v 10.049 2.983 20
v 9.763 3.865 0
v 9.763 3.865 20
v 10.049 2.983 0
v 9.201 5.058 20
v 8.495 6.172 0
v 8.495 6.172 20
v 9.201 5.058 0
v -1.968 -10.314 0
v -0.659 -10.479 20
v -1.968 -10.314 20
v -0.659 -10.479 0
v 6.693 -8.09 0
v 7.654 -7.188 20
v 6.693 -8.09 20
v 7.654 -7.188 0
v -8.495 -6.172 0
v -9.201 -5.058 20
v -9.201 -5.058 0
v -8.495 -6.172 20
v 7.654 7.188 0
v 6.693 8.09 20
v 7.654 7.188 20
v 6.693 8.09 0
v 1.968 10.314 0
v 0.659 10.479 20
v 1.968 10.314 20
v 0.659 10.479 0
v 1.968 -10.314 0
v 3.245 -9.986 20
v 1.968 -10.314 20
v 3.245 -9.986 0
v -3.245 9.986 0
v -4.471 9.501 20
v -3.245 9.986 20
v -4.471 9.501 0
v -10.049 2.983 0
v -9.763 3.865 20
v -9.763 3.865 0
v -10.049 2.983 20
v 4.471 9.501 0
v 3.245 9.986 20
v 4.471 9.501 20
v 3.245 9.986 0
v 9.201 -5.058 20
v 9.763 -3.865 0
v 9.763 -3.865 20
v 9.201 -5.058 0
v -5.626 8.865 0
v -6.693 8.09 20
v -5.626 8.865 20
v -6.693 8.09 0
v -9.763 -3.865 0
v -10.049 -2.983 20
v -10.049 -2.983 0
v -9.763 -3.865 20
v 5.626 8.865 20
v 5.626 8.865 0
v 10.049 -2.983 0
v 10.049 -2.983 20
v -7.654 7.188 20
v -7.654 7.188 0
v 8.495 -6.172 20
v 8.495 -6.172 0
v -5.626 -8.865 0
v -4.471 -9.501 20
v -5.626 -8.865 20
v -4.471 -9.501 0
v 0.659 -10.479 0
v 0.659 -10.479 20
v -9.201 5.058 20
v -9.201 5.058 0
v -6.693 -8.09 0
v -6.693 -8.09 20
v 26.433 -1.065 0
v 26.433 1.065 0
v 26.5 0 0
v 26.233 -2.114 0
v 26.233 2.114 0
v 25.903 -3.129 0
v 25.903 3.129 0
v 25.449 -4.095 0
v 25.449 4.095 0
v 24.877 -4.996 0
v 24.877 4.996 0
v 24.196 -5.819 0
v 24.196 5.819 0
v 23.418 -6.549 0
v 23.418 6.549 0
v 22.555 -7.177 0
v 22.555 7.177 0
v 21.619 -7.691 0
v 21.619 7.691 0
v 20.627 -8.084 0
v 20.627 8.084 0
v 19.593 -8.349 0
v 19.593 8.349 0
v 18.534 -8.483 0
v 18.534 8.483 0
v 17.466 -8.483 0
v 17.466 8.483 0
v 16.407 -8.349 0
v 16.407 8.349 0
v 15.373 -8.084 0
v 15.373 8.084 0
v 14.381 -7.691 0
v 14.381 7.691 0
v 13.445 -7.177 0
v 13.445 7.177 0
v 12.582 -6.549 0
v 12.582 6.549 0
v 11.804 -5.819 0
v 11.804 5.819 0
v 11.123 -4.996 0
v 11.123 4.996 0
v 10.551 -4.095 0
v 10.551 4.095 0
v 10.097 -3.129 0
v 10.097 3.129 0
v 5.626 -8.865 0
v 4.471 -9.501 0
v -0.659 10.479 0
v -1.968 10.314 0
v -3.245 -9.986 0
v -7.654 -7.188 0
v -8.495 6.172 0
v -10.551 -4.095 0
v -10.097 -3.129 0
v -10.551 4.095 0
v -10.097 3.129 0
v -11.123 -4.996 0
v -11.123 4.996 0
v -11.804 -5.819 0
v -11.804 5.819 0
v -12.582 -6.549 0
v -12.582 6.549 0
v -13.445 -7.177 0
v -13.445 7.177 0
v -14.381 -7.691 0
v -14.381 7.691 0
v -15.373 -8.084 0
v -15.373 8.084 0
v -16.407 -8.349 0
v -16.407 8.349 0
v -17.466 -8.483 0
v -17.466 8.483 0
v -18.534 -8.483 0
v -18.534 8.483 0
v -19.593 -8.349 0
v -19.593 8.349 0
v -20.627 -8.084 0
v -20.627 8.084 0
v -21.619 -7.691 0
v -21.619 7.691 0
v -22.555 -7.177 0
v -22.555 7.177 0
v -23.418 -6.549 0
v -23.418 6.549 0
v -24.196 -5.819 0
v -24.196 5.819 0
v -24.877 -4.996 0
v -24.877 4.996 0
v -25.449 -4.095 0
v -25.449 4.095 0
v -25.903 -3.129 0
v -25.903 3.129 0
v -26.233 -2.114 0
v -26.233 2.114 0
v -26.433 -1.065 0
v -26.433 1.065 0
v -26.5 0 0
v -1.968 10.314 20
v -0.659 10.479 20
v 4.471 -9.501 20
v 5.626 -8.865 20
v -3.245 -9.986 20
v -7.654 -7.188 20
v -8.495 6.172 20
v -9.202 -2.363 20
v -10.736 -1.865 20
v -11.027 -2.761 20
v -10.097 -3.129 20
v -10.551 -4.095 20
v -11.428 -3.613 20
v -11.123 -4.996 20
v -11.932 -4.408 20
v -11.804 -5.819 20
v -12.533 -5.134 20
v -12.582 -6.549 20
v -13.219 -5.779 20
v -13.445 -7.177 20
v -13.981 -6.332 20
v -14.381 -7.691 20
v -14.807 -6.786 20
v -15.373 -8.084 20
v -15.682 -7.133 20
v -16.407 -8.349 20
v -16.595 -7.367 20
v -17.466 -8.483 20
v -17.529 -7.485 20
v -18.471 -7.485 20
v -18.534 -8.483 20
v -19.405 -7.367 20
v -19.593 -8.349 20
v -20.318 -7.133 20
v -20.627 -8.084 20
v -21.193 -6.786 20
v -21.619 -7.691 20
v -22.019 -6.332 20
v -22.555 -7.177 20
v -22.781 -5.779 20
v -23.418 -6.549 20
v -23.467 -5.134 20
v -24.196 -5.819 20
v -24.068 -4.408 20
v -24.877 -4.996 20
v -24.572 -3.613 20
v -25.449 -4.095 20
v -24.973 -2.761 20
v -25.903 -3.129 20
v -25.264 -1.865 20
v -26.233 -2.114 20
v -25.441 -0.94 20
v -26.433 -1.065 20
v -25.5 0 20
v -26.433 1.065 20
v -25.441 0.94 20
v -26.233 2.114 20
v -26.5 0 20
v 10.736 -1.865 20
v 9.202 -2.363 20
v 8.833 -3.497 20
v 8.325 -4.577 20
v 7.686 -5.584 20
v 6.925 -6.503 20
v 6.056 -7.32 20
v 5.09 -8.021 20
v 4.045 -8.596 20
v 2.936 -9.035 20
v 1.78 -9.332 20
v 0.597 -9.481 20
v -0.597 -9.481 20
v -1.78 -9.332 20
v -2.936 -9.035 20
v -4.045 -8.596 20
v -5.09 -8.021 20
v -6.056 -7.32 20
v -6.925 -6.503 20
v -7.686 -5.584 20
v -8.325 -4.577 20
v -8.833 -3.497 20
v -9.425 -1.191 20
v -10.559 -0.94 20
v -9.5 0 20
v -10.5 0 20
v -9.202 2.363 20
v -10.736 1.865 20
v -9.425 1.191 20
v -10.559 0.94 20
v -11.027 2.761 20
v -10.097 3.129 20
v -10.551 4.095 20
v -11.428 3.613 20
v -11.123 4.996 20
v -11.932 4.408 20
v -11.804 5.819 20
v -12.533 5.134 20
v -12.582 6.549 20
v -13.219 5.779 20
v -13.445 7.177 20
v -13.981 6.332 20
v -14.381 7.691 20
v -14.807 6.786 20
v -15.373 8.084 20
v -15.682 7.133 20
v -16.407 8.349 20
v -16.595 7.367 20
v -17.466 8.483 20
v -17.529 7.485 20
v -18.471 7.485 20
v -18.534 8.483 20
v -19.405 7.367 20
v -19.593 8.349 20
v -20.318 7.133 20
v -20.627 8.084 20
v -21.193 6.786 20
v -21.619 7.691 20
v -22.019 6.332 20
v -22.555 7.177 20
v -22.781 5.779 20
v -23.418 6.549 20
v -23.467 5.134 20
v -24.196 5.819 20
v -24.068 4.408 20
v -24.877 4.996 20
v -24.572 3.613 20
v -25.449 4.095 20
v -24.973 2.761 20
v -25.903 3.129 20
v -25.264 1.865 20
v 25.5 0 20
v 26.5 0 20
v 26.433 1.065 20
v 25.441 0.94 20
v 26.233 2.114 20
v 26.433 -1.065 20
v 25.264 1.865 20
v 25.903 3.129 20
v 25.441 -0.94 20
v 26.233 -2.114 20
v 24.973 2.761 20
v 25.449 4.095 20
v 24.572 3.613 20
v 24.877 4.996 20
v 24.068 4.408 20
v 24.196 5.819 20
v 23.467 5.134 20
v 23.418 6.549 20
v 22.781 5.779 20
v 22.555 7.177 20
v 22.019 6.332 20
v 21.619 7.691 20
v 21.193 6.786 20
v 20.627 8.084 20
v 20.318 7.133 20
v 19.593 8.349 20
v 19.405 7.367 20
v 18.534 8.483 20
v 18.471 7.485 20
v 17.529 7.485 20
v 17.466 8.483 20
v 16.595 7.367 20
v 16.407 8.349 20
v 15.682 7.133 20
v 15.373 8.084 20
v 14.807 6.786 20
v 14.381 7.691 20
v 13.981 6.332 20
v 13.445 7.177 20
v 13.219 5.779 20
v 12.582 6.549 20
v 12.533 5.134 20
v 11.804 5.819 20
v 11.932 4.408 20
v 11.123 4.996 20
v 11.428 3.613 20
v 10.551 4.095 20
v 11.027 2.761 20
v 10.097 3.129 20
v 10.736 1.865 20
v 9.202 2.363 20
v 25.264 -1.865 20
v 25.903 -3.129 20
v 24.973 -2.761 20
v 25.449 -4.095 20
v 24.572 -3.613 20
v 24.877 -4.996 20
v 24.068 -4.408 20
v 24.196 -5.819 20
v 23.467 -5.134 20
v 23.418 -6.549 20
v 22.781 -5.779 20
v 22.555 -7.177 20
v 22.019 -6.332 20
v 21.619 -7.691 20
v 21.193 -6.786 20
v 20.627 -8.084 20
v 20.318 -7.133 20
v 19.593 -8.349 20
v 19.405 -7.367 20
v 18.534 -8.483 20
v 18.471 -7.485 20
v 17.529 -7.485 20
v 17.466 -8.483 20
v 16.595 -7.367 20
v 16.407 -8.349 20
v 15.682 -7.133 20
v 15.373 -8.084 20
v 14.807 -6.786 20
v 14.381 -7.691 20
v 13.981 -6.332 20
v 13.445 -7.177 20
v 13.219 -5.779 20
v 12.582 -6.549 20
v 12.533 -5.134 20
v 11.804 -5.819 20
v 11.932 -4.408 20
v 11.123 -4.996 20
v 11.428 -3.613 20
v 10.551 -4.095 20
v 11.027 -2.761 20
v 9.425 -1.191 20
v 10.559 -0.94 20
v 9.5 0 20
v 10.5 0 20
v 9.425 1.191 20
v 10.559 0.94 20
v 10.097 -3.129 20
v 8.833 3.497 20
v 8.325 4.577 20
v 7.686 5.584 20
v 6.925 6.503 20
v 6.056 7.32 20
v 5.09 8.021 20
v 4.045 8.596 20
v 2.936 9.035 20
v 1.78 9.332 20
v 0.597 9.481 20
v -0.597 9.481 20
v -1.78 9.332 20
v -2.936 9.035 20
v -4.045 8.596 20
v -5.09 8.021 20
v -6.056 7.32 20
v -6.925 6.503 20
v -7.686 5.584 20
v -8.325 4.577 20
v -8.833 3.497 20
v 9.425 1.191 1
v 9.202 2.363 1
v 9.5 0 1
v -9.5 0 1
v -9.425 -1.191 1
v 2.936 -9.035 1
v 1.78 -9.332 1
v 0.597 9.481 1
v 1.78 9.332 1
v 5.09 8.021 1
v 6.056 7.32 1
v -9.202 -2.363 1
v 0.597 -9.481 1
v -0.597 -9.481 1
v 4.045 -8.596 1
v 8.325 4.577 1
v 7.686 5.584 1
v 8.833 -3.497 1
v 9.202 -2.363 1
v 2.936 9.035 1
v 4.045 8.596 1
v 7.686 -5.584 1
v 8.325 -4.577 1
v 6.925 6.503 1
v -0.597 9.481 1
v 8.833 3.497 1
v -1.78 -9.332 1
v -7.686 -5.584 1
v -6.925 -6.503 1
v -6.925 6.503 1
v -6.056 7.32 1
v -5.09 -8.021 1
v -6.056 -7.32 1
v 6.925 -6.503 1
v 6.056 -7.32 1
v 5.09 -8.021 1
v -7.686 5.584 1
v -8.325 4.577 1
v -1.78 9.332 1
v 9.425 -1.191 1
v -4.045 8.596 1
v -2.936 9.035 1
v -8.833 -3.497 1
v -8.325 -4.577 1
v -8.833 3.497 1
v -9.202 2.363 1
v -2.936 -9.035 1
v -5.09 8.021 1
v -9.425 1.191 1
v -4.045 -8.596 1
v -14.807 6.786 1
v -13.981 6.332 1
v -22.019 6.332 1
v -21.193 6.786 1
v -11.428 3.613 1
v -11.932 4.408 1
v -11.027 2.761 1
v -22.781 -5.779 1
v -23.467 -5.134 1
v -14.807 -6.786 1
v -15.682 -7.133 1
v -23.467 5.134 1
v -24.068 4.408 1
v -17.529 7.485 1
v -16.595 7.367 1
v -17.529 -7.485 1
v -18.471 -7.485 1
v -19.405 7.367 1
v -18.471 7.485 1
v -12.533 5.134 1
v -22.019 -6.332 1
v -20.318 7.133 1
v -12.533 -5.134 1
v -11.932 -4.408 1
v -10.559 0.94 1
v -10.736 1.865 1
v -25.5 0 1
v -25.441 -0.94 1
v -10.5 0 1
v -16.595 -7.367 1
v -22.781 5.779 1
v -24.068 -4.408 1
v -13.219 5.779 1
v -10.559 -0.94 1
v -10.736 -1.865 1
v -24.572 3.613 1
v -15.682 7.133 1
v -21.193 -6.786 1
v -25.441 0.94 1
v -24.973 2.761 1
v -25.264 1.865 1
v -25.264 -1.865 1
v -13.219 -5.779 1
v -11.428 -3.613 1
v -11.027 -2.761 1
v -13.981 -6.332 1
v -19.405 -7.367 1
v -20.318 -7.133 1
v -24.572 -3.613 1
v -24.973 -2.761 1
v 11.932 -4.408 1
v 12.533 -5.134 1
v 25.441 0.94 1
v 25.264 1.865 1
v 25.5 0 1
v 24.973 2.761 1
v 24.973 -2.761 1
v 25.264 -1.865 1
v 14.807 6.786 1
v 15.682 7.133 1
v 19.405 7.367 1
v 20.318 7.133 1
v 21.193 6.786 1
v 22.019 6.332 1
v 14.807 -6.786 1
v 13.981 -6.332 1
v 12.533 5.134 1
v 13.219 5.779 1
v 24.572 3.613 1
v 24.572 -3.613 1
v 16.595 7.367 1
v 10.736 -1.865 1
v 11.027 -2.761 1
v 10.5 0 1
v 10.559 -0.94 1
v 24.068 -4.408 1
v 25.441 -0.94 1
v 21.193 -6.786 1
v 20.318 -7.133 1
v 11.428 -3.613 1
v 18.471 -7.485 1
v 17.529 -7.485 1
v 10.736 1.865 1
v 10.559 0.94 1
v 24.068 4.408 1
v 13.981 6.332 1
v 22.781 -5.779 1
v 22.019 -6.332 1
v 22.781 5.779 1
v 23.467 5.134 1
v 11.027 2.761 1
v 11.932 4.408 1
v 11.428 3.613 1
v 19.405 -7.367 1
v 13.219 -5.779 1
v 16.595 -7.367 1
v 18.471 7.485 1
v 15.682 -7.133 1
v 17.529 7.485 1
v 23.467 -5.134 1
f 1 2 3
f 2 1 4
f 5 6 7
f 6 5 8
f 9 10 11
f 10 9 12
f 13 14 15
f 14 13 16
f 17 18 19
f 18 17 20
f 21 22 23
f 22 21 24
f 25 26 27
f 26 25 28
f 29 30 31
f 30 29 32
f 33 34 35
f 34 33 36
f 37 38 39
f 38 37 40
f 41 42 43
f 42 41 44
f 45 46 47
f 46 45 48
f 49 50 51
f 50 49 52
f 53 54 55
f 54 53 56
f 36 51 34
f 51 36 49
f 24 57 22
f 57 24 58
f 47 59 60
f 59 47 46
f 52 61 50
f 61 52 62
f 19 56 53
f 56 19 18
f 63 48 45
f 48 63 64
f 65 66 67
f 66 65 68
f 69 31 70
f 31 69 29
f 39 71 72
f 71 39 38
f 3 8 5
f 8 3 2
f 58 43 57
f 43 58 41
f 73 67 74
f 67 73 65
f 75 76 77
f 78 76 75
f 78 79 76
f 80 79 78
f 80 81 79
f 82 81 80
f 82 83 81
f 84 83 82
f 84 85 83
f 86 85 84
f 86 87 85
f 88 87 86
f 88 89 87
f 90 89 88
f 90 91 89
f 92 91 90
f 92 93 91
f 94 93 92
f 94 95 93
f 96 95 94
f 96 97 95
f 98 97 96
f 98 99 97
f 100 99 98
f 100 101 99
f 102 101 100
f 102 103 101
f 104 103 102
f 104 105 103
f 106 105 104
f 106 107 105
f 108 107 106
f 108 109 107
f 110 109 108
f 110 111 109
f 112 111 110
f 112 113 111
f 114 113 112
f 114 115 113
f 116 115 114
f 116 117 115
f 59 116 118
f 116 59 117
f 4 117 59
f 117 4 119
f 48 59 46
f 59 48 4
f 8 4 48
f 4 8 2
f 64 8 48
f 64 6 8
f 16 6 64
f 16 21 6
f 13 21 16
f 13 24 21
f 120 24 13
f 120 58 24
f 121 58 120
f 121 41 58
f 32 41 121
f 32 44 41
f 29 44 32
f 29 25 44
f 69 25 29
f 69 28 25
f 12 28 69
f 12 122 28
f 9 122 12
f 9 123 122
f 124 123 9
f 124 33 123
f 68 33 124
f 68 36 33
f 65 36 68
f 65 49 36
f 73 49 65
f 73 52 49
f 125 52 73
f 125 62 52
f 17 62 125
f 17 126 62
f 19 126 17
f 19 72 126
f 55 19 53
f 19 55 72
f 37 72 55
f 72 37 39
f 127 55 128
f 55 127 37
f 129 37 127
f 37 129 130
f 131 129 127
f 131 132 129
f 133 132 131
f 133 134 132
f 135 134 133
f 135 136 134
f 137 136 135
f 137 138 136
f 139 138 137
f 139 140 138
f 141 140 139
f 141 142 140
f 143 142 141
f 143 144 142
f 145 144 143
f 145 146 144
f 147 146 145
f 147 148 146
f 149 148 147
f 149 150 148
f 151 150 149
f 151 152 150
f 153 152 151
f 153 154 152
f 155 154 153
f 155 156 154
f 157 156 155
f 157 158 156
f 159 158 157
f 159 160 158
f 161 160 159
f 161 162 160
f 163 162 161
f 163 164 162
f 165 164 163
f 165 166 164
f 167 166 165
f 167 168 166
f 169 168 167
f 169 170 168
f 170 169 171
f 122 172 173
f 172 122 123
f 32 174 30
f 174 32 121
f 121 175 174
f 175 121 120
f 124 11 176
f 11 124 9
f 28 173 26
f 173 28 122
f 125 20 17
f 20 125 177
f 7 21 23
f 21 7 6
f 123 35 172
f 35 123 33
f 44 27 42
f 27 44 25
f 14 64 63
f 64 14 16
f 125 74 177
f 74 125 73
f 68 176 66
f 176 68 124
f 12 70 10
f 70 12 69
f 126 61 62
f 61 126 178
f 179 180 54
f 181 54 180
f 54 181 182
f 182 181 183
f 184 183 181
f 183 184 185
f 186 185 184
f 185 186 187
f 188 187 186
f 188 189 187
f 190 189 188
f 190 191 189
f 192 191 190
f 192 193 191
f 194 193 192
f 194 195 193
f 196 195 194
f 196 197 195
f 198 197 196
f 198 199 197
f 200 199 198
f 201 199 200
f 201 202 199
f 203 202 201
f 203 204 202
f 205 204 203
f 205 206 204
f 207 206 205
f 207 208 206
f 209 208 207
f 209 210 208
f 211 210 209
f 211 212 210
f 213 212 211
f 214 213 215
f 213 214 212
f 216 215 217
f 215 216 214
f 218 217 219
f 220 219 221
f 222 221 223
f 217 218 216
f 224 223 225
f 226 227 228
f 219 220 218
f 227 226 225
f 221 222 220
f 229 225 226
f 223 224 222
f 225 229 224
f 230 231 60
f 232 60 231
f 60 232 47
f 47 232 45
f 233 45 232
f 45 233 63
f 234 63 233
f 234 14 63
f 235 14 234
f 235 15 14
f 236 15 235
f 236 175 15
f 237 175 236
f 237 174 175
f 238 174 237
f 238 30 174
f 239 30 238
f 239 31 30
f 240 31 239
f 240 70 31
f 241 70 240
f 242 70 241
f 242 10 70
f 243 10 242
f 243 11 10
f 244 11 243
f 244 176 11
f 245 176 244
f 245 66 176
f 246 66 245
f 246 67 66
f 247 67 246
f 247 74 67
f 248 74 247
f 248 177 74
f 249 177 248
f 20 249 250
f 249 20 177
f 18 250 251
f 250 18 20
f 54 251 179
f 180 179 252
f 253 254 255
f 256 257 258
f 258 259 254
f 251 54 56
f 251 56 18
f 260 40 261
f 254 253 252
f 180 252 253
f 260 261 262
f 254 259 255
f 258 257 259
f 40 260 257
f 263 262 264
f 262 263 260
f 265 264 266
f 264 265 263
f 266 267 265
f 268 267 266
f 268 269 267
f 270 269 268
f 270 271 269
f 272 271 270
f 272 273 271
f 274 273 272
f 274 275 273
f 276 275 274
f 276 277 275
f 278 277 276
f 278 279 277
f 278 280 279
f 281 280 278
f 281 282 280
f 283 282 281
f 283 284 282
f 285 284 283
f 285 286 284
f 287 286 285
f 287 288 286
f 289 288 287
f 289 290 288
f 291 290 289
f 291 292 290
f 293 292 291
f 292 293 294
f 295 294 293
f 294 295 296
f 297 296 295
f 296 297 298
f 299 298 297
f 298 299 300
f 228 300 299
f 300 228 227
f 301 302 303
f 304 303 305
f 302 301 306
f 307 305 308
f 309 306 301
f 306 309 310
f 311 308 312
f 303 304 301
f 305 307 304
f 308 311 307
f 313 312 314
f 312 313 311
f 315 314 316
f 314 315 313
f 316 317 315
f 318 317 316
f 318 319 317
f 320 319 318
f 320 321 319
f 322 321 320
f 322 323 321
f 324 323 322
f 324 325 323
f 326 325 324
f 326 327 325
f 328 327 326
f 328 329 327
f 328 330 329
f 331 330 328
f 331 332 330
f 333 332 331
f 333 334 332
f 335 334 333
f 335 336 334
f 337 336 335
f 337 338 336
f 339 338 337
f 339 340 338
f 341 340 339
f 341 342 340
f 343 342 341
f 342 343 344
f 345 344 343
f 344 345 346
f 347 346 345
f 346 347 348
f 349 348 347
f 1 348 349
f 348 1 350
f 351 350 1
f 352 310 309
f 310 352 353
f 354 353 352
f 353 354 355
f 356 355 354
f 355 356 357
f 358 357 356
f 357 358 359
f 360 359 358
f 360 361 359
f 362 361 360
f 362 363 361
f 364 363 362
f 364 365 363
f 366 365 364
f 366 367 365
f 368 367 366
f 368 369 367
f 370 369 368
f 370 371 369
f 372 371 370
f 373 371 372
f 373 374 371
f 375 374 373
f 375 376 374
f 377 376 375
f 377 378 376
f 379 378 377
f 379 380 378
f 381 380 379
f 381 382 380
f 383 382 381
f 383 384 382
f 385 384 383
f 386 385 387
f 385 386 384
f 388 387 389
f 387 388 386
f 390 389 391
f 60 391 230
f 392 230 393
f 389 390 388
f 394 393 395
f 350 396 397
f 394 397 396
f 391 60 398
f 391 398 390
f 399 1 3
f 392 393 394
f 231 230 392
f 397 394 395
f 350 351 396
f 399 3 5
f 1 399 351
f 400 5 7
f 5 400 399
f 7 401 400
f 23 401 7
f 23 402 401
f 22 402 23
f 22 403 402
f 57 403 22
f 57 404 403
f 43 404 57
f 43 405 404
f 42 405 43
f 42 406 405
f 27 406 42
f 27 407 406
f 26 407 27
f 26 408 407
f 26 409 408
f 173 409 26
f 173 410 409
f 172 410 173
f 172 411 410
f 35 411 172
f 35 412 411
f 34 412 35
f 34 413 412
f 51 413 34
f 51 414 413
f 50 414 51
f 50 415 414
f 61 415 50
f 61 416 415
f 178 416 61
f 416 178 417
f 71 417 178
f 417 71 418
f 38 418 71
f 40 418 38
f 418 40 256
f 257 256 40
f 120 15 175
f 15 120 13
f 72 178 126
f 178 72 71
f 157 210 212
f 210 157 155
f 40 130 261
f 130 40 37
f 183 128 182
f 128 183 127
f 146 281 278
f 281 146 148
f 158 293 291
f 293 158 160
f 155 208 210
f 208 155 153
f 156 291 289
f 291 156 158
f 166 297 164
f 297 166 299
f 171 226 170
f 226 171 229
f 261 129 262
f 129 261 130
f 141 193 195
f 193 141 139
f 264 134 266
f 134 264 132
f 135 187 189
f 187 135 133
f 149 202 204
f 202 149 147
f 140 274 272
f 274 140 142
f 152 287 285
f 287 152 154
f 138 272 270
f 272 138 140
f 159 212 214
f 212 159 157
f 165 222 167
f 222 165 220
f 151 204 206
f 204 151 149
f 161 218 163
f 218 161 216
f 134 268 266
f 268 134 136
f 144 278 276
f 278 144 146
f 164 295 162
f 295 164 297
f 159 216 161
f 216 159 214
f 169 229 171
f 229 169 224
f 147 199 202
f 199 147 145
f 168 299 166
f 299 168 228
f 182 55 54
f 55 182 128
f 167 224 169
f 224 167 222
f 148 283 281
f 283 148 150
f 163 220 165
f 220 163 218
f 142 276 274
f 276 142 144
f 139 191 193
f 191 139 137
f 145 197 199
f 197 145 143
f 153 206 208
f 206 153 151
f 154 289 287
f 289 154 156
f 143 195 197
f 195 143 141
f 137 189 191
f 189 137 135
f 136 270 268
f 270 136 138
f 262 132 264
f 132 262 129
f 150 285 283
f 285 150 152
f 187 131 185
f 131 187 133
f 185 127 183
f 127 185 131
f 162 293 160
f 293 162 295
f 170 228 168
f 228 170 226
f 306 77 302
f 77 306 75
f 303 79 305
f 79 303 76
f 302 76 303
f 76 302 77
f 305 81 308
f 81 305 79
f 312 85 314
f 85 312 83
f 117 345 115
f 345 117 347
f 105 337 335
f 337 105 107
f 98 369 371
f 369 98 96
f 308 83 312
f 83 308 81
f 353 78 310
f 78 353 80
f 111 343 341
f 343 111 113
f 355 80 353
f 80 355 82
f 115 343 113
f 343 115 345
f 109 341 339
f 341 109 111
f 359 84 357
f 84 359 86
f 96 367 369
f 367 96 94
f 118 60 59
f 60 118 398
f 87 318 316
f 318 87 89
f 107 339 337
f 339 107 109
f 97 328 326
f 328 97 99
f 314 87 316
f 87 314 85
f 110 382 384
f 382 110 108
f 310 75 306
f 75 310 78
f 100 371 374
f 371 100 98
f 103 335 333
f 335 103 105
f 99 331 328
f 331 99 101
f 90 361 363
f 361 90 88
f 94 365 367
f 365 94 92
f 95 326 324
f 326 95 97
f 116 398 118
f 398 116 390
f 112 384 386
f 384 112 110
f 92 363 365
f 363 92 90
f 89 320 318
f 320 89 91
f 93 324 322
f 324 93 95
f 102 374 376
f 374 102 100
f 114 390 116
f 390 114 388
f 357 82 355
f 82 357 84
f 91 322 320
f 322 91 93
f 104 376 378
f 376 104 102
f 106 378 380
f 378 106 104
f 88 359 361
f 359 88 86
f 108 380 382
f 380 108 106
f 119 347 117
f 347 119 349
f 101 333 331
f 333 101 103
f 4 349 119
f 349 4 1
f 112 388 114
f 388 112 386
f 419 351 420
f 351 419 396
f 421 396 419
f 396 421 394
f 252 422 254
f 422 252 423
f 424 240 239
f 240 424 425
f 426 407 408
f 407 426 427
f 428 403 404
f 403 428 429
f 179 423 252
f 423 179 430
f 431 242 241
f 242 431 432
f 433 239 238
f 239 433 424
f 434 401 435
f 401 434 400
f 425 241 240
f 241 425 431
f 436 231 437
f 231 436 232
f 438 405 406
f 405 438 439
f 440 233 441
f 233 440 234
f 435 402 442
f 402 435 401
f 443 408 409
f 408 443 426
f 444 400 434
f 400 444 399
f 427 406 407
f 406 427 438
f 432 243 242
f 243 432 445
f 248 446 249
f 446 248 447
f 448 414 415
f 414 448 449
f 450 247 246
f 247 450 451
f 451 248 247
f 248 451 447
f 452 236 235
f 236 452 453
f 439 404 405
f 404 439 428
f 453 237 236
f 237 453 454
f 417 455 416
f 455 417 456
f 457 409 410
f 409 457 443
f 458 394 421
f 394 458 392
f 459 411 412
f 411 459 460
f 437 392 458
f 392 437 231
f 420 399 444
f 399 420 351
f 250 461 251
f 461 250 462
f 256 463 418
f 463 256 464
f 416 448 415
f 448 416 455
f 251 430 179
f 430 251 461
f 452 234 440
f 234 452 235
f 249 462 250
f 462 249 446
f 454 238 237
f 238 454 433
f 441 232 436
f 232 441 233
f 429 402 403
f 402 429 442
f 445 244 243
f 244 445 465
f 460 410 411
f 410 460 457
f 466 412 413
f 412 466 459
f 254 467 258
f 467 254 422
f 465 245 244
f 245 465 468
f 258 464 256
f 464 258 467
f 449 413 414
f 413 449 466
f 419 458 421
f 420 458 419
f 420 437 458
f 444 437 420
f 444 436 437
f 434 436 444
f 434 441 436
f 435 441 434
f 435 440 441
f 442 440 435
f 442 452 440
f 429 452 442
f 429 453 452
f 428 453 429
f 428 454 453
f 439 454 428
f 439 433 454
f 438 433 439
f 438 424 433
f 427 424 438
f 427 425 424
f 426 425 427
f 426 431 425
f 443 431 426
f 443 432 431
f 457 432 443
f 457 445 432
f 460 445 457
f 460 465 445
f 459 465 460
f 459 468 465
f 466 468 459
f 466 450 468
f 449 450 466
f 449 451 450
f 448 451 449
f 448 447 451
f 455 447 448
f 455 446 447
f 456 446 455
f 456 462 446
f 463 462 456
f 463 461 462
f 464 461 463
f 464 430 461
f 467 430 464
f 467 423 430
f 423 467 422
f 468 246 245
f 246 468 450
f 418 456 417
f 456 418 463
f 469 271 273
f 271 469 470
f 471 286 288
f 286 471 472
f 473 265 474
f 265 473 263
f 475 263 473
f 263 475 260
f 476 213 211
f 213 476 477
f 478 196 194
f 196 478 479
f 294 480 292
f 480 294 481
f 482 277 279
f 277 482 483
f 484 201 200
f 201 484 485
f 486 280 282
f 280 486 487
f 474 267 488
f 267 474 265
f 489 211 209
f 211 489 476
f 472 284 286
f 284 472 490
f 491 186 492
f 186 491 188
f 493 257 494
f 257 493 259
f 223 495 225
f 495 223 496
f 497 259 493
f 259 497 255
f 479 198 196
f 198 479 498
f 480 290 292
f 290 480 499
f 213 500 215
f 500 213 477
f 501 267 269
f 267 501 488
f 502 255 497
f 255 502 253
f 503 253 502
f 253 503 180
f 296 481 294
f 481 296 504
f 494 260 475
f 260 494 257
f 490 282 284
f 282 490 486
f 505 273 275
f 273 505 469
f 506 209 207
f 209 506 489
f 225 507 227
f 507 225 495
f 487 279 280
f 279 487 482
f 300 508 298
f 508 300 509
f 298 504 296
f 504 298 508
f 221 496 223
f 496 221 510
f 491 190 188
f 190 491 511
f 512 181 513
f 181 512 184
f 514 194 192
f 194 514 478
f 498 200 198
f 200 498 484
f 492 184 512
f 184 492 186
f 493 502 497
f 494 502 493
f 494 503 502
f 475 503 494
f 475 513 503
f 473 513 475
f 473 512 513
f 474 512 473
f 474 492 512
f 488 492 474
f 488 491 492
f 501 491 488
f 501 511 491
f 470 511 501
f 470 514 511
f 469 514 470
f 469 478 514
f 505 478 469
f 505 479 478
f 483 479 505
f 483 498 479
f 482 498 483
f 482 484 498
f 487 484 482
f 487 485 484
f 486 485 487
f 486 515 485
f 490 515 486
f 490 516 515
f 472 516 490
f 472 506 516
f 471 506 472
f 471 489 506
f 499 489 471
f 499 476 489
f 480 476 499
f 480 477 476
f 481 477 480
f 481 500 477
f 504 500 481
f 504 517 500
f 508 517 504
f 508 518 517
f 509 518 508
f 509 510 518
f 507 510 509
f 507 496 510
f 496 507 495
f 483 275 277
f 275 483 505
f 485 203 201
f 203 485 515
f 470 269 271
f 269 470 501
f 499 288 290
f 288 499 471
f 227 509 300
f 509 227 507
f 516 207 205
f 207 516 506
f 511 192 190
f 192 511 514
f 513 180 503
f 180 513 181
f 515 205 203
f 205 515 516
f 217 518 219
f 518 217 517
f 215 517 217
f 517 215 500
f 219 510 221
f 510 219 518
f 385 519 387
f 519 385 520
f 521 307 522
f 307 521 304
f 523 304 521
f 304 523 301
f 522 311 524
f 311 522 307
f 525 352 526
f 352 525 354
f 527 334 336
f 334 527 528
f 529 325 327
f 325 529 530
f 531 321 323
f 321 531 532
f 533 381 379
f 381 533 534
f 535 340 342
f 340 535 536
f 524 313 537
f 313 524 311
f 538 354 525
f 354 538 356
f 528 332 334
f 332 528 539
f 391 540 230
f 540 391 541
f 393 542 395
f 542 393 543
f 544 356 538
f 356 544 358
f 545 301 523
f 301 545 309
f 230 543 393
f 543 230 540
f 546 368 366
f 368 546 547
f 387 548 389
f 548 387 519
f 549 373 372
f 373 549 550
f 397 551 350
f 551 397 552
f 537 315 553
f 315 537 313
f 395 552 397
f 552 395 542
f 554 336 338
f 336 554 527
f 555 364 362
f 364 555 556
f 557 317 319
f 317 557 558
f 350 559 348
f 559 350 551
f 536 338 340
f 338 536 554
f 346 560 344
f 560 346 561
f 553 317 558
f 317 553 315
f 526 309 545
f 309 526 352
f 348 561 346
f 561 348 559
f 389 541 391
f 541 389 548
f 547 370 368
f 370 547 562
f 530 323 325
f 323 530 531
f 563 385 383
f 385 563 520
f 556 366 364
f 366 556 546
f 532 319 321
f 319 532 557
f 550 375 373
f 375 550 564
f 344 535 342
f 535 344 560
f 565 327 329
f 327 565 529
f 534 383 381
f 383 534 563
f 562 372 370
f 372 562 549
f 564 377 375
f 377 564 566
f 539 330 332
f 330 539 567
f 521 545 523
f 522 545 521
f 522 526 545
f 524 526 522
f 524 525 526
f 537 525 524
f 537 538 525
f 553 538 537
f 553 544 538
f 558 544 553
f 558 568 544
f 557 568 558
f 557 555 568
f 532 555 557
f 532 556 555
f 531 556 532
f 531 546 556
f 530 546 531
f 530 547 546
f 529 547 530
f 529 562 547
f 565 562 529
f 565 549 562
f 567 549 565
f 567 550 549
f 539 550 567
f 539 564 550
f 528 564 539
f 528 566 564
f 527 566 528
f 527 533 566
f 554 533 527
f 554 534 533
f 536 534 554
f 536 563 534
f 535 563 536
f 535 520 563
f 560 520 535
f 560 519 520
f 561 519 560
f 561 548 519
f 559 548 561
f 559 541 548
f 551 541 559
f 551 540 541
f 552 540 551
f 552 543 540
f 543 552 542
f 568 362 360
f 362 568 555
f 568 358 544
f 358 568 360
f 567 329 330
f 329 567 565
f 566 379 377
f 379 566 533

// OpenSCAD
$fn = 50;

r1 = 15 / 2;
r2 = 19 / 2;
altura = 20;
wall = 1;

rp = 2 * 3.14159 * r1 + r2 + wall;
ang = floor(360 / (rp / (r1 +  wall)));

pack3(r1,r2, wall, altura);

module pack3(rs, rl, w, h){
difference(){
    union(){
        cylinder(h, rl+w,rl+w);
        translate([-rl-rs-w, 0,0]) cylinder(h, rs+w,rs+w);
        translate([+rl+rs+w, 0,0]) cylinder(h, rs+w,rs+w);
    }
    translate([0,0,w])   cylinder(h, rl,rl);
    translate([-rl-rs-w, 0,w]) cylinder(h, rs,rs);
    translate([+rl+rs+w, 0,w]) cylinder(h, rs,rs);
    }
}
